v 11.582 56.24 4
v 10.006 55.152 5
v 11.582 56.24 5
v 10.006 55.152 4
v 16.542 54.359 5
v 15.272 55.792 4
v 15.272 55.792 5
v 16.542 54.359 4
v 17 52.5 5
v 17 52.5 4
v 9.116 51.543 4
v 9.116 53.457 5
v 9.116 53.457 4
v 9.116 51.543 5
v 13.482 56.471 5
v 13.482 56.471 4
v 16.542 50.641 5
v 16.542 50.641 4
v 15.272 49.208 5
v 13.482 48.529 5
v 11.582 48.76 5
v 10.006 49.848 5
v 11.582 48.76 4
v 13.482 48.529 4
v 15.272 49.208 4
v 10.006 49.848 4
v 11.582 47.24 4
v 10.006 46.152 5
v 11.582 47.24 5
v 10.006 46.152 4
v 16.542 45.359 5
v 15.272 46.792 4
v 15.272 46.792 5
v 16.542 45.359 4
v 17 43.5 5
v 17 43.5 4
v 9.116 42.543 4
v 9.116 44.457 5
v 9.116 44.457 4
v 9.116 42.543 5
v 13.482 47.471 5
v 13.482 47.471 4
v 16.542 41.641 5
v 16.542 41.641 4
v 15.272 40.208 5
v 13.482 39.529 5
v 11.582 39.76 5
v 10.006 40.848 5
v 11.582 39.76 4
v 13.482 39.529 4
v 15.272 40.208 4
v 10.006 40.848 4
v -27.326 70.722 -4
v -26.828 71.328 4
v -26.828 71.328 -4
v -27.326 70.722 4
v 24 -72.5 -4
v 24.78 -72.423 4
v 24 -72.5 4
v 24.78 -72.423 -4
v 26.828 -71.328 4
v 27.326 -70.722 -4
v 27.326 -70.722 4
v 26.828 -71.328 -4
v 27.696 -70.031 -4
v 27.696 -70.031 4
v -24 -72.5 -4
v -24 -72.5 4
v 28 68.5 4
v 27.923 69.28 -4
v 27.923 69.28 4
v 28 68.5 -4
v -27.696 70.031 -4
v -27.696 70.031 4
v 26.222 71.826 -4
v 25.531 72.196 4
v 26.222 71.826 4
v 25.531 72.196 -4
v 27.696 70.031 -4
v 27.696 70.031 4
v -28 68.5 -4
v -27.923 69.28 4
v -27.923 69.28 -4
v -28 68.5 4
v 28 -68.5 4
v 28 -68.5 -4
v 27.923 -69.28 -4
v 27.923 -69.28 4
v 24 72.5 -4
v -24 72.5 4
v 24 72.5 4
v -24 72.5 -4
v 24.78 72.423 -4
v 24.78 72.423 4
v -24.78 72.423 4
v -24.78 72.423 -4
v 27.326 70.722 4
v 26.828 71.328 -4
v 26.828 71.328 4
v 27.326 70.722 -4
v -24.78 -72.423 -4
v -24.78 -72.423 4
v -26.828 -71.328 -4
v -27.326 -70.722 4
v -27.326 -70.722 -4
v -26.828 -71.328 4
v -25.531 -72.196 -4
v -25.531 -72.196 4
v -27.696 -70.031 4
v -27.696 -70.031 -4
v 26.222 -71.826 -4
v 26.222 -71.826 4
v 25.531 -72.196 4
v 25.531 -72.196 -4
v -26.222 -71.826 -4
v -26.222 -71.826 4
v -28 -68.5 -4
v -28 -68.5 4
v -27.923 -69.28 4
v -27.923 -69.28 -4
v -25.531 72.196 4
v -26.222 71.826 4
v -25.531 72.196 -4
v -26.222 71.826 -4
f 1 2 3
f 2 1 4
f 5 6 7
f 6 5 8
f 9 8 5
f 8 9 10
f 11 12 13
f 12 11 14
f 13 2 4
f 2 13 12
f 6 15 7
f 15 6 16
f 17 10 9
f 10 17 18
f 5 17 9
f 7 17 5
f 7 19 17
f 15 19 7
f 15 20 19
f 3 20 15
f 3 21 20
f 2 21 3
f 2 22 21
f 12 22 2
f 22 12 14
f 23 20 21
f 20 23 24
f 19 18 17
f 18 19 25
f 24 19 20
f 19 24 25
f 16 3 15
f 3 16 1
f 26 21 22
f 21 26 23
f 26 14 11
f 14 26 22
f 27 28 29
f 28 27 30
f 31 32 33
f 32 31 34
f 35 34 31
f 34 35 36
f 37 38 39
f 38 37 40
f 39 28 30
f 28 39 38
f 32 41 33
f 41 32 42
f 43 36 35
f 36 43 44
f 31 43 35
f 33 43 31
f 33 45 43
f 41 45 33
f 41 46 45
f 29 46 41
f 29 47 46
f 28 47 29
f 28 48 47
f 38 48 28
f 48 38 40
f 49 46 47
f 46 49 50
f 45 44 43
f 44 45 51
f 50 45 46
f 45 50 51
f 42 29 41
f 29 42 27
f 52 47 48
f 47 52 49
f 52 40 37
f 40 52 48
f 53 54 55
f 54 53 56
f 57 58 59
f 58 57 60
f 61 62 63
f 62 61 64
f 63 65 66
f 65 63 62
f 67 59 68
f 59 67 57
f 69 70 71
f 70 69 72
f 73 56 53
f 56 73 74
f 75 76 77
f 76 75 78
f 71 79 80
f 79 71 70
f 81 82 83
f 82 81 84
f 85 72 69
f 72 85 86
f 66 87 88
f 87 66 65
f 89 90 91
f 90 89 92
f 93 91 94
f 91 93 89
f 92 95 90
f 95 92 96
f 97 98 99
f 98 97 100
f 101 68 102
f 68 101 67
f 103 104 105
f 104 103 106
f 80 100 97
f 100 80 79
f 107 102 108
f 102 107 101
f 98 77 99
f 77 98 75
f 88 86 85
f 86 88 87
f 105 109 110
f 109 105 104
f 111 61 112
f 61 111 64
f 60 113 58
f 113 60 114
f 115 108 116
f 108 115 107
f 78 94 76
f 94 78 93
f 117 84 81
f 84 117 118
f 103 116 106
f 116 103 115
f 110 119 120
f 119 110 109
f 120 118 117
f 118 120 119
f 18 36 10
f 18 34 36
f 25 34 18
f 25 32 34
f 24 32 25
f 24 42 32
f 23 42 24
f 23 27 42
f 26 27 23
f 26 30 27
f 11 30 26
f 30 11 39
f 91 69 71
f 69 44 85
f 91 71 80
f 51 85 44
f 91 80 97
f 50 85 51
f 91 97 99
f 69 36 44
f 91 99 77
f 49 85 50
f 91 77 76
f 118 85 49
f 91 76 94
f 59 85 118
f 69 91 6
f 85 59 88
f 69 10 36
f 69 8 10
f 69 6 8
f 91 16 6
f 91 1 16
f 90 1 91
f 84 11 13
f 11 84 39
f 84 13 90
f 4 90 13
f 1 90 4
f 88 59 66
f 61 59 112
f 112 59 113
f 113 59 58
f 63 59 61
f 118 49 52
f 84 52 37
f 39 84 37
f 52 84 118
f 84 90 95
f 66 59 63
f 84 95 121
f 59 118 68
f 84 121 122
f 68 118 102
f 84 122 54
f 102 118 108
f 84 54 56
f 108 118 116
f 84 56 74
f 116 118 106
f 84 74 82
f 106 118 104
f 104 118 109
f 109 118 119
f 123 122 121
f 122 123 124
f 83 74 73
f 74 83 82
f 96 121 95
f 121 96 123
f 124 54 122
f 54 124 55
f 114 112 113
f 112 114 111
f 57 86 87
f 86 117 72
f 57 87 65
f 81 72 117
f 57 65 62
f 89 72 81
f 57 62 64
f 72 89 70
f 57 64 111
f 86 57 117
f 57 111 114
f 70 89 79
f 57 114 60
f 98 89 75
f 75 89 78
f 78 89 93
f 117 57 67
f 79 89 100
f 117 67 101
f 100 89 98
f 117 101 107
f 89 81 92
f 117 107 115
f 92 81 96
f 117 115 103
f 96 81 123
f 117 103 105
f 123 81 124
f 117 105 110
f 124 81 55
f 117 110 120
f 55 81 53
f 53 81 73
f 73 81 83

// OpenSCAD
// file: smartphone.scad
echo("Работа Павла Поздеева");
len_phone = 145;
width_phone = 56;
thickness_phone = 8;
corner_round = 8;

//color("red")
//translate([0, 0, 10])
//cube([width_phone, len_phone, thickness_phone], center=true);

smartphone();

module smartphone() {
    smartphone_block();
    cameras_block();
}

module cameras_block() {
    color("blue")
    translate([width_phone/2 - 15, len_phone/2 - 20, 0])
        cylinder(d=8, h = thickness_phone/2 + 1);

    color("blue")
    translate([width_phone/2 - 15, len_phone/2 - 29, 0])
        cylinder(d=8, h = thickness_phone/2 + 1);
}

module smartphone_block() {
    hull() {
        translate([width_phone/2 - corner_round/2, len_phone/2 - corner_round/2, 0])
            cylinder(h=thickness_phone, d=corner_round, $fn=32, center=true);

        mirror([1, 0, 0])
        translate([width_phone/2 - corner_round/2, len_phone/2 - corner_round/2, 0])
            cylinder(h=thickness_phone, d=corner_round, $fn=32, center=true);

        mirror([0, 1, 0])
        translate([width_phone/2 - corner_round/2, len_phone/2 - corner_round/2, 0])
            cylinder(h=thickness_phone, d=corner_round, $fn=32, center=true);

        mirror([1, 0, 0])
        mirror([0, 1, 0])
        translate([width_phone/2 - corner_round/2, len_phone/2 - corner_round/2, 0])
            cylinder(h=thickness_phone, d=corner_round, $fn=32, center=true);
    }
}
// main file
use <smartphone.scad>
echo("Работа Евгений Головков!");
smartphone();
